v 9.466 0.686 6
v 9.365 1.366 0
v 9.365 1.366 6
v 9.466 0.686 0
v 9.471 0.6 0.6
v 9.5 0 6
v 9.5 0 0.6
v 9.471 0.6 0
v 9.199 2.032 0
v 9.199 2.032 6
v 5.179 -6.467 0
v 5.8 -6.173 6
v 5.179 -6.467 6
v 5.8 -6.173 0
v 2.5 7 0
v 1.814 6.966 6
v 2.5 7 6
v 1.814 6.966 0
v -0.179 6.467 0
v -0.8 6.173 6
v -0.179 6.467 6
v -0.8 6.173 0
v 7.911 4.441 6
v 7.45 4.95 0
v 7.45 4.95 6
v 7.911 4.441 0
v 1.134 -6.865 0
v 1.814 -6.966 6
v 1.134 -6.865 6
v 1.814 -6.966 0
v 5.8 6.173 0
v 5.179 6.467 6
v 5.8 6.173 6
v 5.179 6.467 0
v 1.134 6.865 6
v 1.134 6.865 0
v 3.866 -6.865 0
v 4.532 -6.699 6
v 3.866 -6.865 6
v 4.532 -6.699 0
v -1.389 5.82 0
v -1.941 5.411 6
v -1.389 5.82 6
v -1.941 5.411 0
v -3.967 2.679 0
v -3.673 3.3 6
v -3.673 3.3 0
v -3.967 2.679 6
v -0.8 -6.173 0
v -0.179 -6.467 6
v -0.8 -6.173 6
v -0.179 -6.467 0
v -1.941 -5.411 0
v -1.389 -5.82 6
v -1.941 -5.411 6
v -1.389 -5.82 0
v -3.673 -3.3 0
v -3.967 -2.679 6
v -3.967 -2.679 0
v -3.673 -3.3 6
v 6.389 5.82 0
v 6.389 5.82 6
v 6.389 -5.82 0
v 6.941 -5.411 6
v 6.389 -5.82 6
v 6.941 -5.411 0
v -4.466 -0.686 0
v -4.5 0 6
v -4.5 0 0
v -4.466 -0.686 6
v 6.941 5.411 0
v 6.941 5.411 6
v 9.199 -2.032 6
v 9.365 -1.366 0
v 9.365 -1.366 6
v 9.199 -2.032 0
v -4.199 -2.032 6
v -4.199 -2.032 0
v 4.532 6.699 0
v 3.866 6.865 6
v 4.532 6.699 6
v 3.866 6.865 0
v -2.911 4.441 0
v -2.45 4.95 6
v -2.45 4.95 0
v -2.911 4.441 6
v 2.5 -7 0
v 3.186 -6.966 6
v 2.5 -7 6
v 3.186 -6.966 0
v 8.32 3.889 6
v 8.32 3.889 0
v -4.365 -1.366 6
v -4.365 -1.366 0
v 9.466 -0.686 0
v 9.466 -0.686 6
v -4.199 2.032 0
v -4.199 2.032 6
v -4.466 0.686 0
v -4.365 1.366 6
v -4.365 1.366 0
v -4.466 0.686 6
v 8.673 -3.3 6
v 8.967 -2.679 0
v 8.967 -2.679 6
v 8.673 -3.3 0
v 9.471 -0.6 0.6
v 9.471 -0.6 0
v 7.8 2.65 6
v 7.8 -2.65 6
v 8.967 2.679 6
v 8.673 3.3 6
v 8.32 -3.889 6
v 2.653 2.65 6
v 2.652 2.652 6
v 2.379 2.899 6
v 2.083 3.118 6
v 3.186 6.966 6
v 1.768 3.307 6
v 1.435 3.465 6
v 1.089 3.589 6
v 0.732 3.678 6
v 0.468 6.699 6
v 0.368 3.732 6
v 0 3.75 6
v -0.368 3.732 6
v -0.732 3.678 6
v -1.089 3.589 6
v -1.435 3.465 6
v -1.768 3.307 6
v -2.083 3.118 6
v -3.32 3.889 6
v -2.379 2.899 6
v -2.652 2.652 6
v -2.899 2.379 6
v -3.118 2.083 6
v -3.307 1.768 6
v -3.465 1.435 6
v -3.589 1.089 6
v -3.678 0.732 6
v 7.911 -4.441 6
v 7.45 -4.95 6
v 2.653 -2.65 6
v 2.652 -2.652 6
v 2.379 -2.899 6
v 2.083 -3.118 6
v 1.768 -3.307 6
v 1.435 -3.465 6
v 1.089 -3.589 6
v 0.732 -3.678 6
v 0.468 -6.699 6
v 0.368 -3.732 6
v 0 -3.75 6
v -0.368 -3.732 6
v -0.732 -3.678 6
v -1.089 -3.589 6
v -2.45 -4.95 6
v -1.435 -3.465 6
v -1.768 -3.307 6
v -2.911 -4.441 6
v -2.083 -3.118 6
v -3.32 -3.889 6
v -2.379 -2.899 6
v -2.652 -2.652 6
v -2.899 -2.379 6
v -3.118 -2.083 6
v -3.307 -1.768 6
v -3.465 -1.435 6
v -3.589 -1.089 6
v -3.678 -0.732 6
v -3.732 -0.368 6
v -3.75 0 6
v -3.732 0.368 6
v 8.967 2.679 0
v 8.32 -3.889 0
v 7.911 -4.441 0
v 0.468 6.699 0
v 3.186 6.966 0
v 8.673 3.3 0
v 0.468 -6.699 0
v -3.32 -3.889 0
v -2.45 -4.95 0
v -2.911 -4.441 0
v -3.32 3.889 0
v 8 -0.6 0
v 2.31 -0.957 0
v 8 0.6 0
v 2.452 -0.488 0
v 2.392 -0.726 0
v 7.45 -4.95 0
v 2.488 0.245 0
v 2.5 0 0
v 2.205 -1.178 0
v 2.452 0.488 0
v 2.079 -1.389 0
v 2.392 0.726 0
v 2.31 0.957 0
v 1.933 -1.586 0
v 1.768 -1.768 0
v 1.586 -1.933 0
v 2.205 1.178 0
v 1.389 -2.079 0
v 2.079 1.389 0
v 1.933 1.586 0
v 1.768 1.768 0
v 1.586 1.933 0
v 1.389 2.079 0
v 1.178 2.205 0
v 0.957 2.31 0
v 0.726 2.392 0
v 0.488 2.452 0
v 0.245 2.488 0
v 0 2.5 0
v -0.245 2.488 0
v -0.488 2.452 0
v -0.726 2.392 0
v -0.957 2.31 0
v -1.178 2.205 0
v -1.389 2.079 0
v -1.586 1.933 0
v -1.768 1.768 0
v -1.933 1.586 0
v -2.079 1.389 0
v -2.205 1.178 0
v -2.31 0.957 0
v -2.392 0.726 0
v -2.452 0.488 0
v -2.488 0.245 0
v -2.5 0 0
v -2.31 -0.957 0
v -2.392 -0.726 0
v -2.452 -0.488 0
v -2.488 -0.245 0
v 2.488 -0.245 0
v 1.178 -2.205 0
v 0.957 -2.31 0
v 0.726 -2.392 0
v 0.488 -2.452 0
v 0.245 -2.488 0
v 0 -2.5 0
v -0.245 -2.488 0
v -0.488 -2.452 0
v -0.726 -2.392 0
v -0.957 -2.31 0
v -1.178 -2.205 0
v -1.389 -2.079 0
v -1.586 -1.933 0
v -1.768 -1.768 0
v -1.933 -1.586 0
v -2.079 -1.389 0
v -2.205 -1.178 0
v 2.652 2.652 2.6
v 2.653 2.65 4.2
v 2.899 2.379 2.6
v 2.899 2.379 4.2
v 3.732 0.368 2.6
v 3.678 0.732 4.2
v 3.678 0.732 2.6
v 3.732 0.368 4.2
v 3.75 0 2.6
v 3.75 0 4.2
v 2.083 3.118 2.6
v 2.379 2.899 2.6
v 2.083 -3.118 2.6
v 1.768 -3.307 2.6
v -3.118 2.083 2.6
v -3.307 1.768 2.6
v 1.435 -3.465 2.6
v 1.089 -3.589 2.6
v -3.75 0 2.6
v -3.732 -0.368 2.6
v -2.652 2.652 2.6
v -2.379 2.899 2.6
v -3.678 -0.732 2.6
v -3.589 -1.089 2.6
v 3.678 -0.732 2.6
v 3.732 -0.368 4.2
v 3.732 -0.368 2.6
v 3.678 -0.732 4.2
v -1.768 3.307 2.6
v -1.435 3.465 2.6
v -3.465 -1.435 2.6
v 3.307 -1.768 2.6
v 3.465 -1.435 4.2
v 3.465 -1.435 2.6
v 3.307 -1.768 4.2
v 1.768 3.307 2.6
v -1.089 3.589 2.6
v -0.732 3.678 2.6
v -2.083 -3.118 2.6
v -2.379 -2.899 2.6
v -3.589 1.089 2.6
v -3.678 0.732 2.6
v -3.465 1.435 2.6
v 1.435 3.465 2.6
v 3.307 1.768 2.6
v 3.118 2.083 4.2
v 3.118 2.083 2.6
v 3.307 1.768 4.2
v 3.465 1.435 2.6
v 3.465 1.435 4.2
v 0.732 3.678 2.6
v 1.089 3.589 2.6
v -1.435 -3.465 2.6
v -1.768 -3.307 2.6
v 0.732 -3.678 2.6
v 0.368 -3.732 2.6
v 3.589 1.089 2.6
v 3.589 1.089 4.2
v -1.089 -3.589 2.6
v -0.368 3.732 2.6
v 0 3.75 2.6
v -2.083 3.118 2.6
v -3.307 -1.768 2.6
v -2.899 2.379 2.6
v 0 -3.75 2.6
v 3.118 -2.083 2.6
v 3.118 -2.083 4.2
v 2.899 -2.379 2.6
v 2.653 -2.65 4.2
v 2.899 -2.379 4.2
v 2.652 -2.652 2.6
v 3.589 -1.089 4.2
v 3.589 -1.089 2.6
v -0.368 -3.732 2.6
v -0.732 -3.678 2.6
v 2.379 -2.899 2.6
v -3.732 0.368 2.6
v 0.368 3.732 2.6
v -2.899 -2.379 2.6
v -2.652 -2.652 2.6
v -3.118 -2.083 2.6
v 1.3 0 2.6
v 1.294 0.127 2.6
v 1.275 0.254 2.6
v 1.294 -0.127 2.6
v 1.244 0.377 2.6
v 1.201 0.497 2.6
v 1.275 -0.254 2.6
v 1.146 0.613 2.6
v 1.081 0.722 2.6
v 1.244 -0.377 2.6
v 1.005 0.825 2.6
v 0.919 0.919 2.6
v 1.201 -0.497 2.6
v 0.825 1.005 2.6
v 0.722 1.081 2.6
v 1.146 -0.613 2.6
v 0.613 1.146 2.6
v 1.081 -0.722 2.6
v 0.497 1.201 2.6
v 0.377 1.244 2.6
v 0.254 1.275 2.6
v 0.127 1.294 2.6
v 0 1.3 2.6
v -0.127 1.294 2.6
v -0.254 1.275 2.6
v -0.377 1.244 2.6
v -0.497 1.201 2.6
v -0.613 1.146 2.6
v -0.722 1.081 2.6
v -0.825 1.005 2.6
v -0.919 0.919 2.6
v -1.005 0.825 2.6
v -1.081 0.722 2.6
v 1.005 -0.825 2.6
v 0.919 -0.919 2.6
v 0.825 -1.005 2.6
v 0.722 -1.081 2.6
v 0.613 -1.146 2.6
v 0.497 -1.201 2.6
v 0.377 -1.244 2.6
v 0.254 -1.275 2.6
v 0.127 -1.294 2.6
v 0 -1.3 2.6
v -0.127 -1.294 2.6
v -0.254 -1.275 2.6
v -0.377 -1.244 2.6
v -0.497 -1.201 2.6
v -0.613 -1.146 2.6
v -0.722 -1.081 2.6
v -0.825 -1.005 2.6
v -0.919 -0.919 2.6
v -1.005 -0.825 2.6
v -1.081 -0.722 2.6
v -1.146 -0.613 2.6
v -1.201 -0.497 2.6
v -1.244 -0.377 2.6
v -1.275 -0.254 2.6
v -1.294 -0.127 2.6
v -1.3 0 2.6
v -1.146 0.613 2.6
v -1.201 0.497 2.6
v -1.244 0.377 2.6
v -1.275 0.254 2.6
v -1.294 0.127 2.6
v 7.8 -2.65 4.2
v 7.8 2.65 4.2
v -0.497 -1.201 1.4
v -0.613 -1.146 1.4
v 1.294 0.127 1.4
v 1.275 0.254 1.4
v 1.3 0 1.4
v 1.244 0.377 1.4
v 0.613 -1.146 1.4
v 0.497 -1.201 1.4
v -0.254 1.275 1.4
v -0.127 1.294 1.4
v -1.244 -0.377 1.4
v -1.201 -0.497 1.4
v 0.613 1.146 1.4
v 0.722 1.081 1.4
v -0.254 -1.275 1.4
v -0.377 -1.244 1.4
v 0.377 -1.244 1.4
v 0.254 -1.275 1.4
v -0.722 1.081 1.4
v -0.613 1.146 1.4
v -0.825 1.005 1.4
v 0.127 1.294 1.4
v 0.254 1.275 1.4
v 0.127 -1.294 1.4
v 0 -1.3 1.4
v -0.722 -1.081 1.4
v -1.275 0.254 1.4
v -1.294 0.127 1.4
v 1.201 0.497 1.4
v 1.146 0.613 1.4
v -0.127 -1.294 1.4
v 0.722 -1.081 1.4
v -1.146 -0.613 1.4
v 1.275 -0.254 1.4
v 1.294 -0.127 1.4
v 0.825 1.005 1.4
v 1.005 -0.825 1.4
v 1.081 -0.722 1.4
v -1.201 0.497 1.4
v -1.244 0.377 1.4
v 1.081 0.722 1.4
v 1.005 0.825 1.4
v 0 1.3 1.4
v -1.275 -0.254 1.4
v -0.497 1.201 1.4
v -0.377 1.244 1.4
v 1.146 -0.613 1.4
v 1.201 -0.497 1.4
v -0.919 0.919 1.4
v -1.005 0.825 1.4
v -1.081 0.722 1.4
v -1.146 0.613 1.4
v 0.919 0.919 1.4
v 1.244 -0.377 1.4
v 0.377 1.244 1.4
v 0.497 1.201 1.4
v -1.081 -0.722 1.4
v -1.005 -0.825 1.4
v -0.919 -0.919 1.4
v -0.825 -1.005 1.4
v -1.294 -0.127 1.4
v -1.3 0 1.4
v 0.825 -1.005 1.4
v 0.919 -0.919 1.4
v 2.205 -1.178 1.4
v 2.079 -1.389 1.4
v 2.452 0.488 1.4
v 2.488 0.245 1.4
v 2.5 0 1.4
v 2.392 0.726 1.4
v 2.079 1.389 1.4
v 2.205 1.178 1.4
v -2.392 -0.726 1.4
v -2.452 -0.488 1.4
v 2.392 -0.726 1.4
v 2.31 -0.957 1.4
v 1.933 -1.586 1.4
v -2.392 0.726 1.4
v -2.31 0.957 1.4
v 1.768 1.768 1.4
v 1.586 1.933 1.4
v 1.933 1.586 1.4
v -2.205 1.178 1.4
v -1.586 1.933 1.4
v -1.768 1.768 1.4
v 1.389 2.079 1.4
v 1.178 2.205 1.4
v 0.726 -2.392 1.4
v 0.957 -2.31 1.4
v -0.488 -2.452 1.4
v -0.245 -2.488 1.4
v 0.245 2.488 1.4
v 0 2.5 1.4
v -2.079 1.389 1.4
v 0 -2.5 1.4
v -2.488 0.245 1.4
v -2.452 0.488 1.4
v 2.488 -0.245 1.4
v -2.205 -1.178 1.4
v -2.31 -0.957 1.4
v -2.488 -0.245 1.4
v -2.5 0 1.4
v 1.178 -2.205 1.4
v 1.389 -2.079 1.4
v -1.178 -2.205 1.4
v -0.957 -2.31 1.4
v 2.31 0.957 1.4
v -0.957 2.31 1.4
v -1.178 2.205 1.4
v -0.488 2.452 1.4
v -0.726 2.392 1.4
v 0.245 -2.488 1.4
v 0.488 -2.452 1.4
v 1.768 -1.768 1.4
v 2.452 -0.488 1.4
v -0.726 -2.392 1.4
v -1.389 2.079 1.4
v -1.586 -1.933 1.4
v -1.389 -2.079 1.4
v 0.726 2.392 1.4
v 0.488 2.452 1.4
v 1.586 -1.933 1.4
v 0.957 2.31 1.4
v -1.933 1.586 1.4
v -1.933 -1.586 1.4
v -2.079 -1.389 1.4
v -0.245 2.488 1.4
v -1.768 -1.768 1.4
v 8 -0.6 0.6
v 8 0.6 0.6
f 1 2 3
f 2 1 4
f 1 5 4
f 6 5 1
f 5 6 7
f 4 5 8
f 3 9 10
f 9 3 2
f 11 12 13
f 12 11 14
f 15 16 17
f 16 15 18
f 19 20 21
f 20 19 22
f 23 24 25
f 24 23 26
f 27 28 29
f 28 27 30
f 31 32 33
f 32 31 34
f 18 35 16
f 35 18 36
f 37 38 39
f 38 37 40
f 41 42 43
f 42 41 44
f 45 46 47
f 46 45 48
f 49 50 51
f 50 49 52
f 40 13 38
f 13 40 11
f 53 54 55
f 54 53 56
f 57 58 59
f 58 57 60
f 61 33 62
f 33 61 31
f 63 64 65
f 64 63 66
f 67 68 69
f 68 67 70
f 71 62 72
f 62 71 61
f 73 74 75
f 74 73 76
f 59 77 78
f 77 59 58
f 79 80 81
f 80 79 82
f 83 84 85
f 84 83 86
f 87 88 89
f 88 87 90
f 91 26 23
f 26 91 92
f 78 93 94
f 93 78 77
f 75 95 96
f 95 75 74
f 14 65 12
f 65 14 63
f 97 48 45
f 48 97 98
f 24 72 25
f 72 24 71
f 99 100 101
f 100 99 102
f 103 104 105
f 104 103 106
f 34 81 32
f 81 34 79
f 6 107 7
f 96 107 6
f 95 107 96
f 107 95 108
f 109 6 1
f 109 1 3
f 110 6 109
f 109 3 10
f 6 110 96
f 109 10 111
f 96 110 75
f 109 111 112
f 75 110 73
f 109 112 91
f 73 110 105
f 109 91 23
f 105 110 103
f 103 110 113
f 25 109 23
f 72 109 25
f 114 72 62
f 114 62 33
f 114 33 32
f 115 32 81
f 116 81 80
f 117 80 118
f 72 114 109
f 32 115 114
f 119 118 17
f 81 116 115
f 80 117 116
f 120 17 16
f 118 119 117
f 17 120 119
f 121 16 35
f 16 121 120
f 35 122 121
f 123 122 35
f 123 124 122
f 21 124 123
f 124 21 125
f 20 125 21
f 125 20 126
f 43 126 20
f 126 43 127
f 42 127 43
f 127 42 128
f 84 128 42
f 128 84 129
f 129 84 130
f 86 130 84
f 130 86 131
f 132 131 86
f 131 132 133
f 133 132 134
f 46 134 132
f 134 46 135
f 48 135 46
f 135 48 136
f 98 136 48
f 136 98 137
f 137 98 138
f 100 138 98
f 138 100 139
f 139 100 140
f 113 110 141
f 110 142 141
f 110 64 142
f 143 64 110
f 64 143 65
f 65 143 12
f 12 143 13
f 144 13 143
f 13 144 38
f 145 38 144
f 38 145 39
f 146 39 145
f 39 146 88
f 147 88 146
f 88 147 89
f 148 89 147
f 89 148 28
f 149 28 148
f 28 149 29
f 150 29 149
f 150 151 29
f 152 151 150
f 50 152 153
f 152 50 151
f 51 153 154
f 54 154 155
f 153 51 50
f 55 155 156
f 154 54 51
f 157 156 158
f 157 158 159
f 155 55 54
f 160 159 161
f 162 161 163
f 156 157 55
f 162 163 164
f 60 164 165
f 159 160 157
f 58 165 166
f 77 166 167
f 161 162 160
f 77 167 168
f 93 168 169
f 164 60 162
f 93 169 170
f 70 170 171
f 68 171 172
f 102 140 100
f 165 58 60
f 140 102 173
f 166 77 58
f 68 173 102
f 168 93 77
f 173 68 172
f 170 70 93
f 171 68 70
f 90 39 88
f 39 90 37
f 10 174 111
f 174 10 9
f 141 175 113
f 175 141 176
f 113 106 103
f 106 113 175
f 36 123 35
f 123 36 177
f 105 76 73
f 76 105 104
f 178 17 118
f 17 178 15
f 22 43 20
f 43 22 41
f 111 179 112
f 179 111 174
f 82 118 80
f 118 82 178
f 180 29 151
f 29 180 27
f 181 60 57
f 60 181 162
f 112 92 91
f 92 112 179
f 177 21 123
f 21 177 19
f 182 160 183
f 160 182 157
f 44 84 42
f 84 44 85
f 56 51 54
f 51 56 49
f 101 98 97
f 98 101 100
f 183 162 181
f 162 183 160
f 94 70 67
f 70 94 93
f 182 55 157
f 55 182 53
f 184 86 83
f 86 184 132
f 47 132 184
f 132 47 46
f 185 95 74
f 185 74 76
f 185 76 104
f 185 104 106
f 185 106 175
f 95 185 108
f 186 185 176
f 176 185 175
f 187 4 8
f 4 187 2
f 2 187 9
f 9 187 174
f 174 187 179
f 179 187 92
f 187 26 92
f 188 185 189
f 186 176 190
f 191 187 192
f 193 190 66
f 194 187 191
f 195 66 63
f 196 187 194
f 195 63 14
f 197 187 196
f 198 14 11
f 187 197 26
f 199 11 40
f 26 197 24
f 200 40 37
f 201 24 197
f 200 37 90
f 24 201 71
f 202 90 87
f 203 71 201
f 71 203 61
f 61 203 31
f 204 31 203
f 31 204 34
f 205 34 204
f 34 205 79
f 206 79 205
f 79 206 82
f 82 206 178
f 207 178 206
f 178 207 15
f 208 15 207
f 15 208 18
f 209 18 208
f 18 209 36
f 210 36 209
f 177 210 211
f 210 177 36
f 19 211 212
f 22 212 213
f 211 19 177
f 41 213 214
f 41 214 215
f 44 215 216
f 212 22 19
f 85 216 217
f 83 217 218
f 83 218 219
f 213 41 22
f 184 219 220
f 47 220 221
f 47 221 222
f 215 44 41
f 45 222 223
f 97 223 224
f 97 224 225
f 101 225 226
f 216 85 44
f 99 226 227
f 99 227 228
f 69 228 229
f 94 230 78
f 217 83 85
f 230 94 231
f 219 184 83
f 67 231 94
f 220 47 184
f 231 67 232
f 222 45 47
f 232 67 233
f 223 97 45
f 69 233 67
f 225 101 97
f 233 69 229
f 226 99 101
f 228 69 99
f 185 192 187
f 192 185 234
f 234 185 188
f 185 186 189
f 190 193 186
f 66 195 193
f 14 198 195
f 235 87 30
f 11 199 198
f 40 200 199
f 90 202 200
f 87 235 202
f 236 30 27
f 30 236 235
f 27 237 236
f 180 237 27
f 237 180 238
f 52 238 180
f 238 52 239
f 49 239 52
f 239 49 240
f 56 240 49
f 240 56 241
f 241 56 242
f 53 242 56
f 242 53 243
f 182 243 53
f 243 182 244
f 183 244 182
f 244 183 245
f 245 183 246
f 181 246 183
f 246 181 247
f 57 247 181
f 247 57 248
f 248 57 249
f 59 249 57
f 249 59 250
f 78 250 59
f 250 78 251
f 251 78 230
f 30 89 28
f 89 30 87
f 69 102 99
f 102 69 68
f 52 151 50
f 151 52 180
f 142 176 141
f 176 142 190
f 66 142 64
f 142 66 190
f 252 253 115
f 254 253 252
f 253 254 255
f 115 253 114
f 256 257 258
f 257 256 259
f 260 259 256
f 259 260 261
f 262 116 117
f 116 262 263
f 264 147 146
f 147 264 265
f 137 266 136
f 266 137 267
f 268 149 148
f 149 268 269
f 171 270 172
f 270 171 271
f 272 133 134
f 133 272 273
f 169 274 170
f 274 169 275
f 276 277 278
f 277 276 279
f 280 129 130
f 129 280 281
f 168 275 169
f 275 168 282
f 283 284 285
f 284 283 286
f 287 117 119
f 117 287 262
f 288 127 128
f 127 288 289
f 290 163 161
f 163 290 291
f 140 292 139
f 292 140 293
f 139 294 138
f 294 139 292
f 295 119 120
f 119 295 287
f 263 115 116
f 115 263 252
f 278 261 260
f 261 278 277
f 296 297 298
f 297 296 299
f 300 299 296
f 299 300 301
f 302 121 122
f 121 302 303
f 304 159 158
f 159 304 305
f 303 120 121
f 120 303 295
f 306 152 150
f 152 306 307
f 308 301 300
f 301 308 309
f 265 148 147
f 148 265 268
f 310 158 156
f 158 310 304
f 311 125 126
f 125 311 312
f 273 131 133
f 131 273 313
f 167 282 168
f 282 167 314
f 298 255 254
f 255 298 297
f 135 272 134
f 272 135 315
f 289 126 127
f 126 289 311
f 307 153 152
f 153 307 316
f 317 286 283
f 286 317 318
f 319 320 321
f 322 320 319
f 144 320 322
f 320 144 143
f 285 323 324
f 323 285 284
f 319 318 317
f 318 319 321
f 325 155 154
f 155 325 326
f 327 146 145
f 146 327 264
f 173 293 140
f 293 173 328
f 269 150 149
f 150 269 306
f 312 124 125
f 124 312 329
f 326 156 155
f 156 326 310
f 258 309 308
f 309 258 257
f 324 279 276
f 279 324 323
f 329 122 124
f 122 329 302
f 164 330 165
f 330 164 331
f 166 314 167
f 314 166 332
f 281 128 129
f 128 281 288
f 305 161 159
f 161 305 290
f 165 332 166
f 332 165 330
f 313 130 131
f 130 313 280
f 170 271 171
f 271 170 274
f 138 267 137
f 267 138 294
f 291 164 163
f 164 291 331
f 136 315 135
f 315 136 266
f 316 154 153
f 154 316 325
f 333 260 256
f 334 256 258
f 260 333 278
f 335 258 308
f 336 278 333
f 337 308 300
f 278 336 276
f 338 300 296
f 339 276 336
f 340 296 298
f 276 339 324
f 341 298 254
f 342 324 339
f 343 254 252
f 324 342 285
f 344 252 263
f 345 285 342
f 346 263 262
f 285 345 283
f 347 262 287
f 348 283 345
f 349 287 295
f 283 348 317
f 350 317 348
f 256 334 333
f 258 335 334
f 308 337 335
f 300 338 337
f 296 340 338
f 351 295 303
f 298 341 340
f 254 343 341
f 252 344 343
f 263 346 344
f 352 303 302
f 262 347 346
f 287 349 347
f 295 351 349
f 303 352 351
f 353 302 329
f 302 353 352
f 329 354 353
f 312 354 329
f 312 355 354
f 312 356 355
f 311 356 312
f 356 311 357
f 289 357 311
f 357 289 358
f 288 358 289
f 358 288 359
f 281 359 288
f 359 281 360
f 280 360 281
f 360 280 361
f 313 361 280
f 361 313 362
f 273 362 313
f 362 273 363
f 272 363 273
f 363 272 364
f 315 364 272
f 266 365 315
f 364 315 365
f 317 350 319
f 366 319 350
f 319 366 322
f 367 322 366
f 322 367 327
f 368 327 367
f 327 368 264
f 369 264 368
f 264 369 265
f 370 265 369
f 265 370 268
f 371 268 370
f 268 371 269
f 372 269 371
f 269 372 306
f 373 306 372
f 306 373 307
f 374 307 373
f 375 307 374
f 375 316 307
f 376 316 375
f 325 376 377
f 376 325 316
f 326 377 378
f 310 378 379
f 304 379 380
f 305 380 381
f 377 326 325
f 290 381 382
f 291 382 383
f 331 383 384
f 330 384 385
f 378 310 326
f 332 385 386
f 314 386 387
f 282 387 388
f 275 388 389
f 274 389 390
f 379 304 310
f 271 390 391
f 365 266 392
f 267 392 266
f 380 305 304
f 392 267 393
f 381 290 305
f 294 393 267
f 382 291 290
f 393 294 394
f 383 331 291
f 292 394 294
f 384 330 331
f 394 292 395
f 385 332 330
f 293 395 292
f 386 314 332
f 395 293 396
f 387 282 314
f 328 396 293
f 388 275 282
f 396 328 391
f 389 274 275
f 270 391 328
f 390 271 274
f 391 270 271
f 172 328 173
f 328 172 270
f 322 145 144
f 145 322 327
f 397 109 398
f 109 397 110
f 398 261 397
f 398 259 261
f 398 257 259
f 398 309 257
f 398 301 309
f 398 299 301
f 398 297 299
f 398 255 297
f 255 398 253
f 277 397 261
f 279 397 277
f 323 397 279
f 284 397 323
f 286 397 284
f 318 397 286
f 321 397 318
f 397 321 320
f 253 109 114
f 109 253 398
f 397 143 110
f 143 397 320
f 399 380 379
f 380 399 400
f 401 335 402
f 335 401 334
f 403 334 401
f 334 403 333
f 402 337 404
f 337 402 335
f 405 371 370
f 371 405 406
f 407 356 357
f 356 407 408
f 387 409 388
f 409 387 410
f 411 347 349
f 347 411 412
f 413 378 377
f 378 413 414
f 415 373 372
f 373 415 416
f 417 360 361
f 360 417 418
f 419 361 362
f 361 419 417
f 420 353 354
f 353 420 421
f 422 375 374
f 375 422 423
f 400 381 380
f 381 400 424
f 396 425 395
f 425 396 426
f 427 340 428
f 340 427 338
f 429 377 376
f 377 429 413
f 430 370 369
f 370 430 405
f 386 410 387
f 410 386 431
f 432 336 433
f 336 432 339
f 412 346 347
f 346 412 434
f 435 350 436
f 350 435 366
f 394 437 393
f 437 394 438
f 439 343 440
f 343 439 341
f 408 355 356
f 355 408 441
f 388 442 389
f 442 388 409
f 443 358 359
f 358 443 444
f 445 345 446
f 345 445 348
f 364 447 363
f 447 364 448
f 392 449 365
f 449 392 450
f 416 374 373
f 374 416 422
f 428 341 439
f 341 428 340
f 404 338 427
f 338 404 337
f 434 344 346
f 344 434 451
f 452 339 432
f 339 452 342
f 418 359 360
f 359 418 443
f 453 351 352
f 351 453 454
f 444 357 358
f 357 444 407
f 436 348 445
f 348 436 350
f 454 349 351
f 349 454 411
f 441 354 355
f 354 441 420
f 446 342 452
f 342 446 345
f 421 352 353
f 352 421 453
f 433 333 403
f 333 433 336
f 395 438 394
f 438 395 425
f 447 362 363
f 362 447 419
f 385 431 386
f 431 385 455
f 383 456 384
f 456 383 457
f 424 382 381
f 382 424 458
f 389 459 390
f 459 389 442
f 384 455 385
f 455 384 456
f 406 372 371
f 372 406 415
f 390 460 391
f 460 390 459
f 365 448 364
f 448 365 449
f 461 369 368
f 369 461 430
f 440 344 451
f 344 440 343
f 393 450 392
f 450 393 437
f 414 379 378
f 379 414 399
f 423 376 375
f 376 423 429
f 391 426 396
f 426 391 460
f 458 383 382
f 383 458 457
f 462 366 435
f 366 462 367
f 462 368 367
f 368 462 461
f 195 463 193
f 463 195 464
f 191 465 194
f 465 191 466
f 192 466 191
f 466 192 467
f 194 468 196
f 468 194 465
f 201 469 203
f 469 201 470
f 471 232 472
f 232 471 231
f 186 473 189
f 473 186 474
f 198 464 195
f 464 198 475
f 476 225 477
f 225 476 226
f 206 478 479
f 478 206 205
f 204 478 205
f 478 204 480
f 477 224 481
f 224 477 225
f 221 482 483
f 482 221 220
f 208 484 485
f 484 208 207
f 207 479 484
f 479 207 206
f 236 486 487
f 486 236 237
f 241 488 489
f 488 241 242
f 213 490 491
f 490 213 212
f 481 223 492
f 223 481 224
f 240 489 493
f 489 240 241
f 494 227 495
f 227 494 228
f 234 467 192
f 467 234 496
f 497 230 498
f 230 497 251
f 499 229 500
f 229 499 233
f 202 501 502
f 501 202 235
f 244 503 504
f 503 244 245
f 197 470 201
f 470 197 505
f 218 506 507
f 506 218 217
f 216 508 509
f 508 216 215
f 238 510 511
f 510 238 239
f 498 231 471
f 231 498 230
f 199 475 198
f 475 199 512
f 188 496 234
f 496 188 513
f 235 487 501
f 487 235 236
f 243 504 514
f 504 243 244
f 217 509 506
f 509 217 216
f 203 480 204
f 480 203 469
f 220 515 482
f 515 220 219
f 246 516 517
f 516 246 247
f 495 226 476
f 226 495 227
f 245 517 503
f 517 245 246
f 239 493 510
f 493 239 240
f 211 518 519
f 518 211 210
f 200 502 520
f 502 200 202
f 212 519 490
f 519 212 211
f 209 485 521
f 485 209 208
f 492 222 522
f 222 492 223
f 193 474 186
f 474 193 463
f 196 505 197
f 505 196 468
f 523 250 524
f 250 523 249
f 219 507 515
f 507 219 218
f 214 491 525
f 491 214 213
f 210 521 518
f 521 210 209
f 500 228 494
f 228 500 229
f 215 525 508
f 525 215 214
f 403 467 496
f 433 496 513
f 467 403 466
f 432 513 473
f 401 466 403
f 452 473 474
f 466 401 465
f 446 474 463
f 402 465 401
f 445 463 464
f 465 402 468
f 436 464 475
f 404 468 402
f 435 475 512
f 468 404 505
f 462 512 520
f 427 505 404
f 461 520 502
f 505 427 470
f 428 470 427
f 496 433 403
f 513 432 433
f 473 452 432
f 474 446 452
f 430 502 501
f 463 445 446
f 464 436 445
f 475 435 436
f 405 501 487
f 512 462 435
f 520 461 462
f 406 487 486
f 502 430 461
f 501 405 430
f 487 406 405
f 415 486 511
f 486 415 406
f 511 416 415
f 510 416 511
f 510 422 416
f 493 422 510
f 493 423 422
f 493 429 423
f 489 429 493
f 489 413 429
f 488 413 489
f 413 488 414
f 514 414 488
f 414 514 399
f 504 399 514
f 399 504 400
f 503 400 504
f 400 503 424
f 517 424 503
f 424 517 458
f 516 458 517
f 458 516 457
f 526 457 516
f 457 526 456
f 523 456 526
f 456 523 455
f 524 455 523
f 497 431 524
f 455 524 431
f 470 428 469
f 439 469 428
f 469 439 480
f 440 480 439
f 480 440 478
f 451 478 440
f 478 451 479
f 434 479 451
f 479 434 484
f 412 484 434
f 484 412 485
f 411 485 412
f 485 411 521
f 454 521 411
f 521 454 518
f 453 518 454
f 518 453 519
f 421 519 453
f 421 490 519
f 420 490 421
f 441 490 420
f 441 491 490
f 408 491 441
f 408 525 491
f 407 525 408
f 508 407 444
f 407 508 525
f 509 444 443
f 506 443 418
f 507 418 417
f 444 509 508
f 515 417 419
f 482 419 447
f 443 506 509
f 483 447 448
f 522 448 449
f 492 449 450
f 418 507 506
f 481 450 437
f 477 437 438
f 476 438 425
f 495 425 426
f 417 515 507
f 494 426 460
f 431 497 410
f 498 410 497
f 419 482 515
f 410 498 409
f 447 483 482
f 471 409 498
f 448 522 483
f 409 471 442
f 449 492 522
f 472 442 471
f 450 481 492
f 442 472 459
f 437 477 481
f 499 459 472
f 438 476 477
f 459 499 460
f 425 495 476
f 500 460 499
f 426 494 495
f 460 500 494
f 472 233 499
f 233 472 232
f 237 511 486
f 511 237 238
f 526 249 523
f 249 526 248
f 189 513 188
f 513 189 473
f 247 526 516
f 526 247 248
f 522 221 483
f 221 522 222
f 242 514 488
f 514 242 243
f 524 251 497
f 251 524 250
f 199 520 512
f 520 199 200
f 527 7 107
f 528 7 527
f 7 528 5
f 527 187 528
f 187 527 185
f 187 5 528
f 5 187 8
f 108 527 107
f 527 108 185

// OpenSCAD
// Eccentric cam, fits over the trimmed stock horn. Print 4.
// Print orientation: front face on the bed.
include <params.scad>
include <lib.scad>

translate([0, 0, cam_t]) mirror([0, 0, 1]) servo_cam();
